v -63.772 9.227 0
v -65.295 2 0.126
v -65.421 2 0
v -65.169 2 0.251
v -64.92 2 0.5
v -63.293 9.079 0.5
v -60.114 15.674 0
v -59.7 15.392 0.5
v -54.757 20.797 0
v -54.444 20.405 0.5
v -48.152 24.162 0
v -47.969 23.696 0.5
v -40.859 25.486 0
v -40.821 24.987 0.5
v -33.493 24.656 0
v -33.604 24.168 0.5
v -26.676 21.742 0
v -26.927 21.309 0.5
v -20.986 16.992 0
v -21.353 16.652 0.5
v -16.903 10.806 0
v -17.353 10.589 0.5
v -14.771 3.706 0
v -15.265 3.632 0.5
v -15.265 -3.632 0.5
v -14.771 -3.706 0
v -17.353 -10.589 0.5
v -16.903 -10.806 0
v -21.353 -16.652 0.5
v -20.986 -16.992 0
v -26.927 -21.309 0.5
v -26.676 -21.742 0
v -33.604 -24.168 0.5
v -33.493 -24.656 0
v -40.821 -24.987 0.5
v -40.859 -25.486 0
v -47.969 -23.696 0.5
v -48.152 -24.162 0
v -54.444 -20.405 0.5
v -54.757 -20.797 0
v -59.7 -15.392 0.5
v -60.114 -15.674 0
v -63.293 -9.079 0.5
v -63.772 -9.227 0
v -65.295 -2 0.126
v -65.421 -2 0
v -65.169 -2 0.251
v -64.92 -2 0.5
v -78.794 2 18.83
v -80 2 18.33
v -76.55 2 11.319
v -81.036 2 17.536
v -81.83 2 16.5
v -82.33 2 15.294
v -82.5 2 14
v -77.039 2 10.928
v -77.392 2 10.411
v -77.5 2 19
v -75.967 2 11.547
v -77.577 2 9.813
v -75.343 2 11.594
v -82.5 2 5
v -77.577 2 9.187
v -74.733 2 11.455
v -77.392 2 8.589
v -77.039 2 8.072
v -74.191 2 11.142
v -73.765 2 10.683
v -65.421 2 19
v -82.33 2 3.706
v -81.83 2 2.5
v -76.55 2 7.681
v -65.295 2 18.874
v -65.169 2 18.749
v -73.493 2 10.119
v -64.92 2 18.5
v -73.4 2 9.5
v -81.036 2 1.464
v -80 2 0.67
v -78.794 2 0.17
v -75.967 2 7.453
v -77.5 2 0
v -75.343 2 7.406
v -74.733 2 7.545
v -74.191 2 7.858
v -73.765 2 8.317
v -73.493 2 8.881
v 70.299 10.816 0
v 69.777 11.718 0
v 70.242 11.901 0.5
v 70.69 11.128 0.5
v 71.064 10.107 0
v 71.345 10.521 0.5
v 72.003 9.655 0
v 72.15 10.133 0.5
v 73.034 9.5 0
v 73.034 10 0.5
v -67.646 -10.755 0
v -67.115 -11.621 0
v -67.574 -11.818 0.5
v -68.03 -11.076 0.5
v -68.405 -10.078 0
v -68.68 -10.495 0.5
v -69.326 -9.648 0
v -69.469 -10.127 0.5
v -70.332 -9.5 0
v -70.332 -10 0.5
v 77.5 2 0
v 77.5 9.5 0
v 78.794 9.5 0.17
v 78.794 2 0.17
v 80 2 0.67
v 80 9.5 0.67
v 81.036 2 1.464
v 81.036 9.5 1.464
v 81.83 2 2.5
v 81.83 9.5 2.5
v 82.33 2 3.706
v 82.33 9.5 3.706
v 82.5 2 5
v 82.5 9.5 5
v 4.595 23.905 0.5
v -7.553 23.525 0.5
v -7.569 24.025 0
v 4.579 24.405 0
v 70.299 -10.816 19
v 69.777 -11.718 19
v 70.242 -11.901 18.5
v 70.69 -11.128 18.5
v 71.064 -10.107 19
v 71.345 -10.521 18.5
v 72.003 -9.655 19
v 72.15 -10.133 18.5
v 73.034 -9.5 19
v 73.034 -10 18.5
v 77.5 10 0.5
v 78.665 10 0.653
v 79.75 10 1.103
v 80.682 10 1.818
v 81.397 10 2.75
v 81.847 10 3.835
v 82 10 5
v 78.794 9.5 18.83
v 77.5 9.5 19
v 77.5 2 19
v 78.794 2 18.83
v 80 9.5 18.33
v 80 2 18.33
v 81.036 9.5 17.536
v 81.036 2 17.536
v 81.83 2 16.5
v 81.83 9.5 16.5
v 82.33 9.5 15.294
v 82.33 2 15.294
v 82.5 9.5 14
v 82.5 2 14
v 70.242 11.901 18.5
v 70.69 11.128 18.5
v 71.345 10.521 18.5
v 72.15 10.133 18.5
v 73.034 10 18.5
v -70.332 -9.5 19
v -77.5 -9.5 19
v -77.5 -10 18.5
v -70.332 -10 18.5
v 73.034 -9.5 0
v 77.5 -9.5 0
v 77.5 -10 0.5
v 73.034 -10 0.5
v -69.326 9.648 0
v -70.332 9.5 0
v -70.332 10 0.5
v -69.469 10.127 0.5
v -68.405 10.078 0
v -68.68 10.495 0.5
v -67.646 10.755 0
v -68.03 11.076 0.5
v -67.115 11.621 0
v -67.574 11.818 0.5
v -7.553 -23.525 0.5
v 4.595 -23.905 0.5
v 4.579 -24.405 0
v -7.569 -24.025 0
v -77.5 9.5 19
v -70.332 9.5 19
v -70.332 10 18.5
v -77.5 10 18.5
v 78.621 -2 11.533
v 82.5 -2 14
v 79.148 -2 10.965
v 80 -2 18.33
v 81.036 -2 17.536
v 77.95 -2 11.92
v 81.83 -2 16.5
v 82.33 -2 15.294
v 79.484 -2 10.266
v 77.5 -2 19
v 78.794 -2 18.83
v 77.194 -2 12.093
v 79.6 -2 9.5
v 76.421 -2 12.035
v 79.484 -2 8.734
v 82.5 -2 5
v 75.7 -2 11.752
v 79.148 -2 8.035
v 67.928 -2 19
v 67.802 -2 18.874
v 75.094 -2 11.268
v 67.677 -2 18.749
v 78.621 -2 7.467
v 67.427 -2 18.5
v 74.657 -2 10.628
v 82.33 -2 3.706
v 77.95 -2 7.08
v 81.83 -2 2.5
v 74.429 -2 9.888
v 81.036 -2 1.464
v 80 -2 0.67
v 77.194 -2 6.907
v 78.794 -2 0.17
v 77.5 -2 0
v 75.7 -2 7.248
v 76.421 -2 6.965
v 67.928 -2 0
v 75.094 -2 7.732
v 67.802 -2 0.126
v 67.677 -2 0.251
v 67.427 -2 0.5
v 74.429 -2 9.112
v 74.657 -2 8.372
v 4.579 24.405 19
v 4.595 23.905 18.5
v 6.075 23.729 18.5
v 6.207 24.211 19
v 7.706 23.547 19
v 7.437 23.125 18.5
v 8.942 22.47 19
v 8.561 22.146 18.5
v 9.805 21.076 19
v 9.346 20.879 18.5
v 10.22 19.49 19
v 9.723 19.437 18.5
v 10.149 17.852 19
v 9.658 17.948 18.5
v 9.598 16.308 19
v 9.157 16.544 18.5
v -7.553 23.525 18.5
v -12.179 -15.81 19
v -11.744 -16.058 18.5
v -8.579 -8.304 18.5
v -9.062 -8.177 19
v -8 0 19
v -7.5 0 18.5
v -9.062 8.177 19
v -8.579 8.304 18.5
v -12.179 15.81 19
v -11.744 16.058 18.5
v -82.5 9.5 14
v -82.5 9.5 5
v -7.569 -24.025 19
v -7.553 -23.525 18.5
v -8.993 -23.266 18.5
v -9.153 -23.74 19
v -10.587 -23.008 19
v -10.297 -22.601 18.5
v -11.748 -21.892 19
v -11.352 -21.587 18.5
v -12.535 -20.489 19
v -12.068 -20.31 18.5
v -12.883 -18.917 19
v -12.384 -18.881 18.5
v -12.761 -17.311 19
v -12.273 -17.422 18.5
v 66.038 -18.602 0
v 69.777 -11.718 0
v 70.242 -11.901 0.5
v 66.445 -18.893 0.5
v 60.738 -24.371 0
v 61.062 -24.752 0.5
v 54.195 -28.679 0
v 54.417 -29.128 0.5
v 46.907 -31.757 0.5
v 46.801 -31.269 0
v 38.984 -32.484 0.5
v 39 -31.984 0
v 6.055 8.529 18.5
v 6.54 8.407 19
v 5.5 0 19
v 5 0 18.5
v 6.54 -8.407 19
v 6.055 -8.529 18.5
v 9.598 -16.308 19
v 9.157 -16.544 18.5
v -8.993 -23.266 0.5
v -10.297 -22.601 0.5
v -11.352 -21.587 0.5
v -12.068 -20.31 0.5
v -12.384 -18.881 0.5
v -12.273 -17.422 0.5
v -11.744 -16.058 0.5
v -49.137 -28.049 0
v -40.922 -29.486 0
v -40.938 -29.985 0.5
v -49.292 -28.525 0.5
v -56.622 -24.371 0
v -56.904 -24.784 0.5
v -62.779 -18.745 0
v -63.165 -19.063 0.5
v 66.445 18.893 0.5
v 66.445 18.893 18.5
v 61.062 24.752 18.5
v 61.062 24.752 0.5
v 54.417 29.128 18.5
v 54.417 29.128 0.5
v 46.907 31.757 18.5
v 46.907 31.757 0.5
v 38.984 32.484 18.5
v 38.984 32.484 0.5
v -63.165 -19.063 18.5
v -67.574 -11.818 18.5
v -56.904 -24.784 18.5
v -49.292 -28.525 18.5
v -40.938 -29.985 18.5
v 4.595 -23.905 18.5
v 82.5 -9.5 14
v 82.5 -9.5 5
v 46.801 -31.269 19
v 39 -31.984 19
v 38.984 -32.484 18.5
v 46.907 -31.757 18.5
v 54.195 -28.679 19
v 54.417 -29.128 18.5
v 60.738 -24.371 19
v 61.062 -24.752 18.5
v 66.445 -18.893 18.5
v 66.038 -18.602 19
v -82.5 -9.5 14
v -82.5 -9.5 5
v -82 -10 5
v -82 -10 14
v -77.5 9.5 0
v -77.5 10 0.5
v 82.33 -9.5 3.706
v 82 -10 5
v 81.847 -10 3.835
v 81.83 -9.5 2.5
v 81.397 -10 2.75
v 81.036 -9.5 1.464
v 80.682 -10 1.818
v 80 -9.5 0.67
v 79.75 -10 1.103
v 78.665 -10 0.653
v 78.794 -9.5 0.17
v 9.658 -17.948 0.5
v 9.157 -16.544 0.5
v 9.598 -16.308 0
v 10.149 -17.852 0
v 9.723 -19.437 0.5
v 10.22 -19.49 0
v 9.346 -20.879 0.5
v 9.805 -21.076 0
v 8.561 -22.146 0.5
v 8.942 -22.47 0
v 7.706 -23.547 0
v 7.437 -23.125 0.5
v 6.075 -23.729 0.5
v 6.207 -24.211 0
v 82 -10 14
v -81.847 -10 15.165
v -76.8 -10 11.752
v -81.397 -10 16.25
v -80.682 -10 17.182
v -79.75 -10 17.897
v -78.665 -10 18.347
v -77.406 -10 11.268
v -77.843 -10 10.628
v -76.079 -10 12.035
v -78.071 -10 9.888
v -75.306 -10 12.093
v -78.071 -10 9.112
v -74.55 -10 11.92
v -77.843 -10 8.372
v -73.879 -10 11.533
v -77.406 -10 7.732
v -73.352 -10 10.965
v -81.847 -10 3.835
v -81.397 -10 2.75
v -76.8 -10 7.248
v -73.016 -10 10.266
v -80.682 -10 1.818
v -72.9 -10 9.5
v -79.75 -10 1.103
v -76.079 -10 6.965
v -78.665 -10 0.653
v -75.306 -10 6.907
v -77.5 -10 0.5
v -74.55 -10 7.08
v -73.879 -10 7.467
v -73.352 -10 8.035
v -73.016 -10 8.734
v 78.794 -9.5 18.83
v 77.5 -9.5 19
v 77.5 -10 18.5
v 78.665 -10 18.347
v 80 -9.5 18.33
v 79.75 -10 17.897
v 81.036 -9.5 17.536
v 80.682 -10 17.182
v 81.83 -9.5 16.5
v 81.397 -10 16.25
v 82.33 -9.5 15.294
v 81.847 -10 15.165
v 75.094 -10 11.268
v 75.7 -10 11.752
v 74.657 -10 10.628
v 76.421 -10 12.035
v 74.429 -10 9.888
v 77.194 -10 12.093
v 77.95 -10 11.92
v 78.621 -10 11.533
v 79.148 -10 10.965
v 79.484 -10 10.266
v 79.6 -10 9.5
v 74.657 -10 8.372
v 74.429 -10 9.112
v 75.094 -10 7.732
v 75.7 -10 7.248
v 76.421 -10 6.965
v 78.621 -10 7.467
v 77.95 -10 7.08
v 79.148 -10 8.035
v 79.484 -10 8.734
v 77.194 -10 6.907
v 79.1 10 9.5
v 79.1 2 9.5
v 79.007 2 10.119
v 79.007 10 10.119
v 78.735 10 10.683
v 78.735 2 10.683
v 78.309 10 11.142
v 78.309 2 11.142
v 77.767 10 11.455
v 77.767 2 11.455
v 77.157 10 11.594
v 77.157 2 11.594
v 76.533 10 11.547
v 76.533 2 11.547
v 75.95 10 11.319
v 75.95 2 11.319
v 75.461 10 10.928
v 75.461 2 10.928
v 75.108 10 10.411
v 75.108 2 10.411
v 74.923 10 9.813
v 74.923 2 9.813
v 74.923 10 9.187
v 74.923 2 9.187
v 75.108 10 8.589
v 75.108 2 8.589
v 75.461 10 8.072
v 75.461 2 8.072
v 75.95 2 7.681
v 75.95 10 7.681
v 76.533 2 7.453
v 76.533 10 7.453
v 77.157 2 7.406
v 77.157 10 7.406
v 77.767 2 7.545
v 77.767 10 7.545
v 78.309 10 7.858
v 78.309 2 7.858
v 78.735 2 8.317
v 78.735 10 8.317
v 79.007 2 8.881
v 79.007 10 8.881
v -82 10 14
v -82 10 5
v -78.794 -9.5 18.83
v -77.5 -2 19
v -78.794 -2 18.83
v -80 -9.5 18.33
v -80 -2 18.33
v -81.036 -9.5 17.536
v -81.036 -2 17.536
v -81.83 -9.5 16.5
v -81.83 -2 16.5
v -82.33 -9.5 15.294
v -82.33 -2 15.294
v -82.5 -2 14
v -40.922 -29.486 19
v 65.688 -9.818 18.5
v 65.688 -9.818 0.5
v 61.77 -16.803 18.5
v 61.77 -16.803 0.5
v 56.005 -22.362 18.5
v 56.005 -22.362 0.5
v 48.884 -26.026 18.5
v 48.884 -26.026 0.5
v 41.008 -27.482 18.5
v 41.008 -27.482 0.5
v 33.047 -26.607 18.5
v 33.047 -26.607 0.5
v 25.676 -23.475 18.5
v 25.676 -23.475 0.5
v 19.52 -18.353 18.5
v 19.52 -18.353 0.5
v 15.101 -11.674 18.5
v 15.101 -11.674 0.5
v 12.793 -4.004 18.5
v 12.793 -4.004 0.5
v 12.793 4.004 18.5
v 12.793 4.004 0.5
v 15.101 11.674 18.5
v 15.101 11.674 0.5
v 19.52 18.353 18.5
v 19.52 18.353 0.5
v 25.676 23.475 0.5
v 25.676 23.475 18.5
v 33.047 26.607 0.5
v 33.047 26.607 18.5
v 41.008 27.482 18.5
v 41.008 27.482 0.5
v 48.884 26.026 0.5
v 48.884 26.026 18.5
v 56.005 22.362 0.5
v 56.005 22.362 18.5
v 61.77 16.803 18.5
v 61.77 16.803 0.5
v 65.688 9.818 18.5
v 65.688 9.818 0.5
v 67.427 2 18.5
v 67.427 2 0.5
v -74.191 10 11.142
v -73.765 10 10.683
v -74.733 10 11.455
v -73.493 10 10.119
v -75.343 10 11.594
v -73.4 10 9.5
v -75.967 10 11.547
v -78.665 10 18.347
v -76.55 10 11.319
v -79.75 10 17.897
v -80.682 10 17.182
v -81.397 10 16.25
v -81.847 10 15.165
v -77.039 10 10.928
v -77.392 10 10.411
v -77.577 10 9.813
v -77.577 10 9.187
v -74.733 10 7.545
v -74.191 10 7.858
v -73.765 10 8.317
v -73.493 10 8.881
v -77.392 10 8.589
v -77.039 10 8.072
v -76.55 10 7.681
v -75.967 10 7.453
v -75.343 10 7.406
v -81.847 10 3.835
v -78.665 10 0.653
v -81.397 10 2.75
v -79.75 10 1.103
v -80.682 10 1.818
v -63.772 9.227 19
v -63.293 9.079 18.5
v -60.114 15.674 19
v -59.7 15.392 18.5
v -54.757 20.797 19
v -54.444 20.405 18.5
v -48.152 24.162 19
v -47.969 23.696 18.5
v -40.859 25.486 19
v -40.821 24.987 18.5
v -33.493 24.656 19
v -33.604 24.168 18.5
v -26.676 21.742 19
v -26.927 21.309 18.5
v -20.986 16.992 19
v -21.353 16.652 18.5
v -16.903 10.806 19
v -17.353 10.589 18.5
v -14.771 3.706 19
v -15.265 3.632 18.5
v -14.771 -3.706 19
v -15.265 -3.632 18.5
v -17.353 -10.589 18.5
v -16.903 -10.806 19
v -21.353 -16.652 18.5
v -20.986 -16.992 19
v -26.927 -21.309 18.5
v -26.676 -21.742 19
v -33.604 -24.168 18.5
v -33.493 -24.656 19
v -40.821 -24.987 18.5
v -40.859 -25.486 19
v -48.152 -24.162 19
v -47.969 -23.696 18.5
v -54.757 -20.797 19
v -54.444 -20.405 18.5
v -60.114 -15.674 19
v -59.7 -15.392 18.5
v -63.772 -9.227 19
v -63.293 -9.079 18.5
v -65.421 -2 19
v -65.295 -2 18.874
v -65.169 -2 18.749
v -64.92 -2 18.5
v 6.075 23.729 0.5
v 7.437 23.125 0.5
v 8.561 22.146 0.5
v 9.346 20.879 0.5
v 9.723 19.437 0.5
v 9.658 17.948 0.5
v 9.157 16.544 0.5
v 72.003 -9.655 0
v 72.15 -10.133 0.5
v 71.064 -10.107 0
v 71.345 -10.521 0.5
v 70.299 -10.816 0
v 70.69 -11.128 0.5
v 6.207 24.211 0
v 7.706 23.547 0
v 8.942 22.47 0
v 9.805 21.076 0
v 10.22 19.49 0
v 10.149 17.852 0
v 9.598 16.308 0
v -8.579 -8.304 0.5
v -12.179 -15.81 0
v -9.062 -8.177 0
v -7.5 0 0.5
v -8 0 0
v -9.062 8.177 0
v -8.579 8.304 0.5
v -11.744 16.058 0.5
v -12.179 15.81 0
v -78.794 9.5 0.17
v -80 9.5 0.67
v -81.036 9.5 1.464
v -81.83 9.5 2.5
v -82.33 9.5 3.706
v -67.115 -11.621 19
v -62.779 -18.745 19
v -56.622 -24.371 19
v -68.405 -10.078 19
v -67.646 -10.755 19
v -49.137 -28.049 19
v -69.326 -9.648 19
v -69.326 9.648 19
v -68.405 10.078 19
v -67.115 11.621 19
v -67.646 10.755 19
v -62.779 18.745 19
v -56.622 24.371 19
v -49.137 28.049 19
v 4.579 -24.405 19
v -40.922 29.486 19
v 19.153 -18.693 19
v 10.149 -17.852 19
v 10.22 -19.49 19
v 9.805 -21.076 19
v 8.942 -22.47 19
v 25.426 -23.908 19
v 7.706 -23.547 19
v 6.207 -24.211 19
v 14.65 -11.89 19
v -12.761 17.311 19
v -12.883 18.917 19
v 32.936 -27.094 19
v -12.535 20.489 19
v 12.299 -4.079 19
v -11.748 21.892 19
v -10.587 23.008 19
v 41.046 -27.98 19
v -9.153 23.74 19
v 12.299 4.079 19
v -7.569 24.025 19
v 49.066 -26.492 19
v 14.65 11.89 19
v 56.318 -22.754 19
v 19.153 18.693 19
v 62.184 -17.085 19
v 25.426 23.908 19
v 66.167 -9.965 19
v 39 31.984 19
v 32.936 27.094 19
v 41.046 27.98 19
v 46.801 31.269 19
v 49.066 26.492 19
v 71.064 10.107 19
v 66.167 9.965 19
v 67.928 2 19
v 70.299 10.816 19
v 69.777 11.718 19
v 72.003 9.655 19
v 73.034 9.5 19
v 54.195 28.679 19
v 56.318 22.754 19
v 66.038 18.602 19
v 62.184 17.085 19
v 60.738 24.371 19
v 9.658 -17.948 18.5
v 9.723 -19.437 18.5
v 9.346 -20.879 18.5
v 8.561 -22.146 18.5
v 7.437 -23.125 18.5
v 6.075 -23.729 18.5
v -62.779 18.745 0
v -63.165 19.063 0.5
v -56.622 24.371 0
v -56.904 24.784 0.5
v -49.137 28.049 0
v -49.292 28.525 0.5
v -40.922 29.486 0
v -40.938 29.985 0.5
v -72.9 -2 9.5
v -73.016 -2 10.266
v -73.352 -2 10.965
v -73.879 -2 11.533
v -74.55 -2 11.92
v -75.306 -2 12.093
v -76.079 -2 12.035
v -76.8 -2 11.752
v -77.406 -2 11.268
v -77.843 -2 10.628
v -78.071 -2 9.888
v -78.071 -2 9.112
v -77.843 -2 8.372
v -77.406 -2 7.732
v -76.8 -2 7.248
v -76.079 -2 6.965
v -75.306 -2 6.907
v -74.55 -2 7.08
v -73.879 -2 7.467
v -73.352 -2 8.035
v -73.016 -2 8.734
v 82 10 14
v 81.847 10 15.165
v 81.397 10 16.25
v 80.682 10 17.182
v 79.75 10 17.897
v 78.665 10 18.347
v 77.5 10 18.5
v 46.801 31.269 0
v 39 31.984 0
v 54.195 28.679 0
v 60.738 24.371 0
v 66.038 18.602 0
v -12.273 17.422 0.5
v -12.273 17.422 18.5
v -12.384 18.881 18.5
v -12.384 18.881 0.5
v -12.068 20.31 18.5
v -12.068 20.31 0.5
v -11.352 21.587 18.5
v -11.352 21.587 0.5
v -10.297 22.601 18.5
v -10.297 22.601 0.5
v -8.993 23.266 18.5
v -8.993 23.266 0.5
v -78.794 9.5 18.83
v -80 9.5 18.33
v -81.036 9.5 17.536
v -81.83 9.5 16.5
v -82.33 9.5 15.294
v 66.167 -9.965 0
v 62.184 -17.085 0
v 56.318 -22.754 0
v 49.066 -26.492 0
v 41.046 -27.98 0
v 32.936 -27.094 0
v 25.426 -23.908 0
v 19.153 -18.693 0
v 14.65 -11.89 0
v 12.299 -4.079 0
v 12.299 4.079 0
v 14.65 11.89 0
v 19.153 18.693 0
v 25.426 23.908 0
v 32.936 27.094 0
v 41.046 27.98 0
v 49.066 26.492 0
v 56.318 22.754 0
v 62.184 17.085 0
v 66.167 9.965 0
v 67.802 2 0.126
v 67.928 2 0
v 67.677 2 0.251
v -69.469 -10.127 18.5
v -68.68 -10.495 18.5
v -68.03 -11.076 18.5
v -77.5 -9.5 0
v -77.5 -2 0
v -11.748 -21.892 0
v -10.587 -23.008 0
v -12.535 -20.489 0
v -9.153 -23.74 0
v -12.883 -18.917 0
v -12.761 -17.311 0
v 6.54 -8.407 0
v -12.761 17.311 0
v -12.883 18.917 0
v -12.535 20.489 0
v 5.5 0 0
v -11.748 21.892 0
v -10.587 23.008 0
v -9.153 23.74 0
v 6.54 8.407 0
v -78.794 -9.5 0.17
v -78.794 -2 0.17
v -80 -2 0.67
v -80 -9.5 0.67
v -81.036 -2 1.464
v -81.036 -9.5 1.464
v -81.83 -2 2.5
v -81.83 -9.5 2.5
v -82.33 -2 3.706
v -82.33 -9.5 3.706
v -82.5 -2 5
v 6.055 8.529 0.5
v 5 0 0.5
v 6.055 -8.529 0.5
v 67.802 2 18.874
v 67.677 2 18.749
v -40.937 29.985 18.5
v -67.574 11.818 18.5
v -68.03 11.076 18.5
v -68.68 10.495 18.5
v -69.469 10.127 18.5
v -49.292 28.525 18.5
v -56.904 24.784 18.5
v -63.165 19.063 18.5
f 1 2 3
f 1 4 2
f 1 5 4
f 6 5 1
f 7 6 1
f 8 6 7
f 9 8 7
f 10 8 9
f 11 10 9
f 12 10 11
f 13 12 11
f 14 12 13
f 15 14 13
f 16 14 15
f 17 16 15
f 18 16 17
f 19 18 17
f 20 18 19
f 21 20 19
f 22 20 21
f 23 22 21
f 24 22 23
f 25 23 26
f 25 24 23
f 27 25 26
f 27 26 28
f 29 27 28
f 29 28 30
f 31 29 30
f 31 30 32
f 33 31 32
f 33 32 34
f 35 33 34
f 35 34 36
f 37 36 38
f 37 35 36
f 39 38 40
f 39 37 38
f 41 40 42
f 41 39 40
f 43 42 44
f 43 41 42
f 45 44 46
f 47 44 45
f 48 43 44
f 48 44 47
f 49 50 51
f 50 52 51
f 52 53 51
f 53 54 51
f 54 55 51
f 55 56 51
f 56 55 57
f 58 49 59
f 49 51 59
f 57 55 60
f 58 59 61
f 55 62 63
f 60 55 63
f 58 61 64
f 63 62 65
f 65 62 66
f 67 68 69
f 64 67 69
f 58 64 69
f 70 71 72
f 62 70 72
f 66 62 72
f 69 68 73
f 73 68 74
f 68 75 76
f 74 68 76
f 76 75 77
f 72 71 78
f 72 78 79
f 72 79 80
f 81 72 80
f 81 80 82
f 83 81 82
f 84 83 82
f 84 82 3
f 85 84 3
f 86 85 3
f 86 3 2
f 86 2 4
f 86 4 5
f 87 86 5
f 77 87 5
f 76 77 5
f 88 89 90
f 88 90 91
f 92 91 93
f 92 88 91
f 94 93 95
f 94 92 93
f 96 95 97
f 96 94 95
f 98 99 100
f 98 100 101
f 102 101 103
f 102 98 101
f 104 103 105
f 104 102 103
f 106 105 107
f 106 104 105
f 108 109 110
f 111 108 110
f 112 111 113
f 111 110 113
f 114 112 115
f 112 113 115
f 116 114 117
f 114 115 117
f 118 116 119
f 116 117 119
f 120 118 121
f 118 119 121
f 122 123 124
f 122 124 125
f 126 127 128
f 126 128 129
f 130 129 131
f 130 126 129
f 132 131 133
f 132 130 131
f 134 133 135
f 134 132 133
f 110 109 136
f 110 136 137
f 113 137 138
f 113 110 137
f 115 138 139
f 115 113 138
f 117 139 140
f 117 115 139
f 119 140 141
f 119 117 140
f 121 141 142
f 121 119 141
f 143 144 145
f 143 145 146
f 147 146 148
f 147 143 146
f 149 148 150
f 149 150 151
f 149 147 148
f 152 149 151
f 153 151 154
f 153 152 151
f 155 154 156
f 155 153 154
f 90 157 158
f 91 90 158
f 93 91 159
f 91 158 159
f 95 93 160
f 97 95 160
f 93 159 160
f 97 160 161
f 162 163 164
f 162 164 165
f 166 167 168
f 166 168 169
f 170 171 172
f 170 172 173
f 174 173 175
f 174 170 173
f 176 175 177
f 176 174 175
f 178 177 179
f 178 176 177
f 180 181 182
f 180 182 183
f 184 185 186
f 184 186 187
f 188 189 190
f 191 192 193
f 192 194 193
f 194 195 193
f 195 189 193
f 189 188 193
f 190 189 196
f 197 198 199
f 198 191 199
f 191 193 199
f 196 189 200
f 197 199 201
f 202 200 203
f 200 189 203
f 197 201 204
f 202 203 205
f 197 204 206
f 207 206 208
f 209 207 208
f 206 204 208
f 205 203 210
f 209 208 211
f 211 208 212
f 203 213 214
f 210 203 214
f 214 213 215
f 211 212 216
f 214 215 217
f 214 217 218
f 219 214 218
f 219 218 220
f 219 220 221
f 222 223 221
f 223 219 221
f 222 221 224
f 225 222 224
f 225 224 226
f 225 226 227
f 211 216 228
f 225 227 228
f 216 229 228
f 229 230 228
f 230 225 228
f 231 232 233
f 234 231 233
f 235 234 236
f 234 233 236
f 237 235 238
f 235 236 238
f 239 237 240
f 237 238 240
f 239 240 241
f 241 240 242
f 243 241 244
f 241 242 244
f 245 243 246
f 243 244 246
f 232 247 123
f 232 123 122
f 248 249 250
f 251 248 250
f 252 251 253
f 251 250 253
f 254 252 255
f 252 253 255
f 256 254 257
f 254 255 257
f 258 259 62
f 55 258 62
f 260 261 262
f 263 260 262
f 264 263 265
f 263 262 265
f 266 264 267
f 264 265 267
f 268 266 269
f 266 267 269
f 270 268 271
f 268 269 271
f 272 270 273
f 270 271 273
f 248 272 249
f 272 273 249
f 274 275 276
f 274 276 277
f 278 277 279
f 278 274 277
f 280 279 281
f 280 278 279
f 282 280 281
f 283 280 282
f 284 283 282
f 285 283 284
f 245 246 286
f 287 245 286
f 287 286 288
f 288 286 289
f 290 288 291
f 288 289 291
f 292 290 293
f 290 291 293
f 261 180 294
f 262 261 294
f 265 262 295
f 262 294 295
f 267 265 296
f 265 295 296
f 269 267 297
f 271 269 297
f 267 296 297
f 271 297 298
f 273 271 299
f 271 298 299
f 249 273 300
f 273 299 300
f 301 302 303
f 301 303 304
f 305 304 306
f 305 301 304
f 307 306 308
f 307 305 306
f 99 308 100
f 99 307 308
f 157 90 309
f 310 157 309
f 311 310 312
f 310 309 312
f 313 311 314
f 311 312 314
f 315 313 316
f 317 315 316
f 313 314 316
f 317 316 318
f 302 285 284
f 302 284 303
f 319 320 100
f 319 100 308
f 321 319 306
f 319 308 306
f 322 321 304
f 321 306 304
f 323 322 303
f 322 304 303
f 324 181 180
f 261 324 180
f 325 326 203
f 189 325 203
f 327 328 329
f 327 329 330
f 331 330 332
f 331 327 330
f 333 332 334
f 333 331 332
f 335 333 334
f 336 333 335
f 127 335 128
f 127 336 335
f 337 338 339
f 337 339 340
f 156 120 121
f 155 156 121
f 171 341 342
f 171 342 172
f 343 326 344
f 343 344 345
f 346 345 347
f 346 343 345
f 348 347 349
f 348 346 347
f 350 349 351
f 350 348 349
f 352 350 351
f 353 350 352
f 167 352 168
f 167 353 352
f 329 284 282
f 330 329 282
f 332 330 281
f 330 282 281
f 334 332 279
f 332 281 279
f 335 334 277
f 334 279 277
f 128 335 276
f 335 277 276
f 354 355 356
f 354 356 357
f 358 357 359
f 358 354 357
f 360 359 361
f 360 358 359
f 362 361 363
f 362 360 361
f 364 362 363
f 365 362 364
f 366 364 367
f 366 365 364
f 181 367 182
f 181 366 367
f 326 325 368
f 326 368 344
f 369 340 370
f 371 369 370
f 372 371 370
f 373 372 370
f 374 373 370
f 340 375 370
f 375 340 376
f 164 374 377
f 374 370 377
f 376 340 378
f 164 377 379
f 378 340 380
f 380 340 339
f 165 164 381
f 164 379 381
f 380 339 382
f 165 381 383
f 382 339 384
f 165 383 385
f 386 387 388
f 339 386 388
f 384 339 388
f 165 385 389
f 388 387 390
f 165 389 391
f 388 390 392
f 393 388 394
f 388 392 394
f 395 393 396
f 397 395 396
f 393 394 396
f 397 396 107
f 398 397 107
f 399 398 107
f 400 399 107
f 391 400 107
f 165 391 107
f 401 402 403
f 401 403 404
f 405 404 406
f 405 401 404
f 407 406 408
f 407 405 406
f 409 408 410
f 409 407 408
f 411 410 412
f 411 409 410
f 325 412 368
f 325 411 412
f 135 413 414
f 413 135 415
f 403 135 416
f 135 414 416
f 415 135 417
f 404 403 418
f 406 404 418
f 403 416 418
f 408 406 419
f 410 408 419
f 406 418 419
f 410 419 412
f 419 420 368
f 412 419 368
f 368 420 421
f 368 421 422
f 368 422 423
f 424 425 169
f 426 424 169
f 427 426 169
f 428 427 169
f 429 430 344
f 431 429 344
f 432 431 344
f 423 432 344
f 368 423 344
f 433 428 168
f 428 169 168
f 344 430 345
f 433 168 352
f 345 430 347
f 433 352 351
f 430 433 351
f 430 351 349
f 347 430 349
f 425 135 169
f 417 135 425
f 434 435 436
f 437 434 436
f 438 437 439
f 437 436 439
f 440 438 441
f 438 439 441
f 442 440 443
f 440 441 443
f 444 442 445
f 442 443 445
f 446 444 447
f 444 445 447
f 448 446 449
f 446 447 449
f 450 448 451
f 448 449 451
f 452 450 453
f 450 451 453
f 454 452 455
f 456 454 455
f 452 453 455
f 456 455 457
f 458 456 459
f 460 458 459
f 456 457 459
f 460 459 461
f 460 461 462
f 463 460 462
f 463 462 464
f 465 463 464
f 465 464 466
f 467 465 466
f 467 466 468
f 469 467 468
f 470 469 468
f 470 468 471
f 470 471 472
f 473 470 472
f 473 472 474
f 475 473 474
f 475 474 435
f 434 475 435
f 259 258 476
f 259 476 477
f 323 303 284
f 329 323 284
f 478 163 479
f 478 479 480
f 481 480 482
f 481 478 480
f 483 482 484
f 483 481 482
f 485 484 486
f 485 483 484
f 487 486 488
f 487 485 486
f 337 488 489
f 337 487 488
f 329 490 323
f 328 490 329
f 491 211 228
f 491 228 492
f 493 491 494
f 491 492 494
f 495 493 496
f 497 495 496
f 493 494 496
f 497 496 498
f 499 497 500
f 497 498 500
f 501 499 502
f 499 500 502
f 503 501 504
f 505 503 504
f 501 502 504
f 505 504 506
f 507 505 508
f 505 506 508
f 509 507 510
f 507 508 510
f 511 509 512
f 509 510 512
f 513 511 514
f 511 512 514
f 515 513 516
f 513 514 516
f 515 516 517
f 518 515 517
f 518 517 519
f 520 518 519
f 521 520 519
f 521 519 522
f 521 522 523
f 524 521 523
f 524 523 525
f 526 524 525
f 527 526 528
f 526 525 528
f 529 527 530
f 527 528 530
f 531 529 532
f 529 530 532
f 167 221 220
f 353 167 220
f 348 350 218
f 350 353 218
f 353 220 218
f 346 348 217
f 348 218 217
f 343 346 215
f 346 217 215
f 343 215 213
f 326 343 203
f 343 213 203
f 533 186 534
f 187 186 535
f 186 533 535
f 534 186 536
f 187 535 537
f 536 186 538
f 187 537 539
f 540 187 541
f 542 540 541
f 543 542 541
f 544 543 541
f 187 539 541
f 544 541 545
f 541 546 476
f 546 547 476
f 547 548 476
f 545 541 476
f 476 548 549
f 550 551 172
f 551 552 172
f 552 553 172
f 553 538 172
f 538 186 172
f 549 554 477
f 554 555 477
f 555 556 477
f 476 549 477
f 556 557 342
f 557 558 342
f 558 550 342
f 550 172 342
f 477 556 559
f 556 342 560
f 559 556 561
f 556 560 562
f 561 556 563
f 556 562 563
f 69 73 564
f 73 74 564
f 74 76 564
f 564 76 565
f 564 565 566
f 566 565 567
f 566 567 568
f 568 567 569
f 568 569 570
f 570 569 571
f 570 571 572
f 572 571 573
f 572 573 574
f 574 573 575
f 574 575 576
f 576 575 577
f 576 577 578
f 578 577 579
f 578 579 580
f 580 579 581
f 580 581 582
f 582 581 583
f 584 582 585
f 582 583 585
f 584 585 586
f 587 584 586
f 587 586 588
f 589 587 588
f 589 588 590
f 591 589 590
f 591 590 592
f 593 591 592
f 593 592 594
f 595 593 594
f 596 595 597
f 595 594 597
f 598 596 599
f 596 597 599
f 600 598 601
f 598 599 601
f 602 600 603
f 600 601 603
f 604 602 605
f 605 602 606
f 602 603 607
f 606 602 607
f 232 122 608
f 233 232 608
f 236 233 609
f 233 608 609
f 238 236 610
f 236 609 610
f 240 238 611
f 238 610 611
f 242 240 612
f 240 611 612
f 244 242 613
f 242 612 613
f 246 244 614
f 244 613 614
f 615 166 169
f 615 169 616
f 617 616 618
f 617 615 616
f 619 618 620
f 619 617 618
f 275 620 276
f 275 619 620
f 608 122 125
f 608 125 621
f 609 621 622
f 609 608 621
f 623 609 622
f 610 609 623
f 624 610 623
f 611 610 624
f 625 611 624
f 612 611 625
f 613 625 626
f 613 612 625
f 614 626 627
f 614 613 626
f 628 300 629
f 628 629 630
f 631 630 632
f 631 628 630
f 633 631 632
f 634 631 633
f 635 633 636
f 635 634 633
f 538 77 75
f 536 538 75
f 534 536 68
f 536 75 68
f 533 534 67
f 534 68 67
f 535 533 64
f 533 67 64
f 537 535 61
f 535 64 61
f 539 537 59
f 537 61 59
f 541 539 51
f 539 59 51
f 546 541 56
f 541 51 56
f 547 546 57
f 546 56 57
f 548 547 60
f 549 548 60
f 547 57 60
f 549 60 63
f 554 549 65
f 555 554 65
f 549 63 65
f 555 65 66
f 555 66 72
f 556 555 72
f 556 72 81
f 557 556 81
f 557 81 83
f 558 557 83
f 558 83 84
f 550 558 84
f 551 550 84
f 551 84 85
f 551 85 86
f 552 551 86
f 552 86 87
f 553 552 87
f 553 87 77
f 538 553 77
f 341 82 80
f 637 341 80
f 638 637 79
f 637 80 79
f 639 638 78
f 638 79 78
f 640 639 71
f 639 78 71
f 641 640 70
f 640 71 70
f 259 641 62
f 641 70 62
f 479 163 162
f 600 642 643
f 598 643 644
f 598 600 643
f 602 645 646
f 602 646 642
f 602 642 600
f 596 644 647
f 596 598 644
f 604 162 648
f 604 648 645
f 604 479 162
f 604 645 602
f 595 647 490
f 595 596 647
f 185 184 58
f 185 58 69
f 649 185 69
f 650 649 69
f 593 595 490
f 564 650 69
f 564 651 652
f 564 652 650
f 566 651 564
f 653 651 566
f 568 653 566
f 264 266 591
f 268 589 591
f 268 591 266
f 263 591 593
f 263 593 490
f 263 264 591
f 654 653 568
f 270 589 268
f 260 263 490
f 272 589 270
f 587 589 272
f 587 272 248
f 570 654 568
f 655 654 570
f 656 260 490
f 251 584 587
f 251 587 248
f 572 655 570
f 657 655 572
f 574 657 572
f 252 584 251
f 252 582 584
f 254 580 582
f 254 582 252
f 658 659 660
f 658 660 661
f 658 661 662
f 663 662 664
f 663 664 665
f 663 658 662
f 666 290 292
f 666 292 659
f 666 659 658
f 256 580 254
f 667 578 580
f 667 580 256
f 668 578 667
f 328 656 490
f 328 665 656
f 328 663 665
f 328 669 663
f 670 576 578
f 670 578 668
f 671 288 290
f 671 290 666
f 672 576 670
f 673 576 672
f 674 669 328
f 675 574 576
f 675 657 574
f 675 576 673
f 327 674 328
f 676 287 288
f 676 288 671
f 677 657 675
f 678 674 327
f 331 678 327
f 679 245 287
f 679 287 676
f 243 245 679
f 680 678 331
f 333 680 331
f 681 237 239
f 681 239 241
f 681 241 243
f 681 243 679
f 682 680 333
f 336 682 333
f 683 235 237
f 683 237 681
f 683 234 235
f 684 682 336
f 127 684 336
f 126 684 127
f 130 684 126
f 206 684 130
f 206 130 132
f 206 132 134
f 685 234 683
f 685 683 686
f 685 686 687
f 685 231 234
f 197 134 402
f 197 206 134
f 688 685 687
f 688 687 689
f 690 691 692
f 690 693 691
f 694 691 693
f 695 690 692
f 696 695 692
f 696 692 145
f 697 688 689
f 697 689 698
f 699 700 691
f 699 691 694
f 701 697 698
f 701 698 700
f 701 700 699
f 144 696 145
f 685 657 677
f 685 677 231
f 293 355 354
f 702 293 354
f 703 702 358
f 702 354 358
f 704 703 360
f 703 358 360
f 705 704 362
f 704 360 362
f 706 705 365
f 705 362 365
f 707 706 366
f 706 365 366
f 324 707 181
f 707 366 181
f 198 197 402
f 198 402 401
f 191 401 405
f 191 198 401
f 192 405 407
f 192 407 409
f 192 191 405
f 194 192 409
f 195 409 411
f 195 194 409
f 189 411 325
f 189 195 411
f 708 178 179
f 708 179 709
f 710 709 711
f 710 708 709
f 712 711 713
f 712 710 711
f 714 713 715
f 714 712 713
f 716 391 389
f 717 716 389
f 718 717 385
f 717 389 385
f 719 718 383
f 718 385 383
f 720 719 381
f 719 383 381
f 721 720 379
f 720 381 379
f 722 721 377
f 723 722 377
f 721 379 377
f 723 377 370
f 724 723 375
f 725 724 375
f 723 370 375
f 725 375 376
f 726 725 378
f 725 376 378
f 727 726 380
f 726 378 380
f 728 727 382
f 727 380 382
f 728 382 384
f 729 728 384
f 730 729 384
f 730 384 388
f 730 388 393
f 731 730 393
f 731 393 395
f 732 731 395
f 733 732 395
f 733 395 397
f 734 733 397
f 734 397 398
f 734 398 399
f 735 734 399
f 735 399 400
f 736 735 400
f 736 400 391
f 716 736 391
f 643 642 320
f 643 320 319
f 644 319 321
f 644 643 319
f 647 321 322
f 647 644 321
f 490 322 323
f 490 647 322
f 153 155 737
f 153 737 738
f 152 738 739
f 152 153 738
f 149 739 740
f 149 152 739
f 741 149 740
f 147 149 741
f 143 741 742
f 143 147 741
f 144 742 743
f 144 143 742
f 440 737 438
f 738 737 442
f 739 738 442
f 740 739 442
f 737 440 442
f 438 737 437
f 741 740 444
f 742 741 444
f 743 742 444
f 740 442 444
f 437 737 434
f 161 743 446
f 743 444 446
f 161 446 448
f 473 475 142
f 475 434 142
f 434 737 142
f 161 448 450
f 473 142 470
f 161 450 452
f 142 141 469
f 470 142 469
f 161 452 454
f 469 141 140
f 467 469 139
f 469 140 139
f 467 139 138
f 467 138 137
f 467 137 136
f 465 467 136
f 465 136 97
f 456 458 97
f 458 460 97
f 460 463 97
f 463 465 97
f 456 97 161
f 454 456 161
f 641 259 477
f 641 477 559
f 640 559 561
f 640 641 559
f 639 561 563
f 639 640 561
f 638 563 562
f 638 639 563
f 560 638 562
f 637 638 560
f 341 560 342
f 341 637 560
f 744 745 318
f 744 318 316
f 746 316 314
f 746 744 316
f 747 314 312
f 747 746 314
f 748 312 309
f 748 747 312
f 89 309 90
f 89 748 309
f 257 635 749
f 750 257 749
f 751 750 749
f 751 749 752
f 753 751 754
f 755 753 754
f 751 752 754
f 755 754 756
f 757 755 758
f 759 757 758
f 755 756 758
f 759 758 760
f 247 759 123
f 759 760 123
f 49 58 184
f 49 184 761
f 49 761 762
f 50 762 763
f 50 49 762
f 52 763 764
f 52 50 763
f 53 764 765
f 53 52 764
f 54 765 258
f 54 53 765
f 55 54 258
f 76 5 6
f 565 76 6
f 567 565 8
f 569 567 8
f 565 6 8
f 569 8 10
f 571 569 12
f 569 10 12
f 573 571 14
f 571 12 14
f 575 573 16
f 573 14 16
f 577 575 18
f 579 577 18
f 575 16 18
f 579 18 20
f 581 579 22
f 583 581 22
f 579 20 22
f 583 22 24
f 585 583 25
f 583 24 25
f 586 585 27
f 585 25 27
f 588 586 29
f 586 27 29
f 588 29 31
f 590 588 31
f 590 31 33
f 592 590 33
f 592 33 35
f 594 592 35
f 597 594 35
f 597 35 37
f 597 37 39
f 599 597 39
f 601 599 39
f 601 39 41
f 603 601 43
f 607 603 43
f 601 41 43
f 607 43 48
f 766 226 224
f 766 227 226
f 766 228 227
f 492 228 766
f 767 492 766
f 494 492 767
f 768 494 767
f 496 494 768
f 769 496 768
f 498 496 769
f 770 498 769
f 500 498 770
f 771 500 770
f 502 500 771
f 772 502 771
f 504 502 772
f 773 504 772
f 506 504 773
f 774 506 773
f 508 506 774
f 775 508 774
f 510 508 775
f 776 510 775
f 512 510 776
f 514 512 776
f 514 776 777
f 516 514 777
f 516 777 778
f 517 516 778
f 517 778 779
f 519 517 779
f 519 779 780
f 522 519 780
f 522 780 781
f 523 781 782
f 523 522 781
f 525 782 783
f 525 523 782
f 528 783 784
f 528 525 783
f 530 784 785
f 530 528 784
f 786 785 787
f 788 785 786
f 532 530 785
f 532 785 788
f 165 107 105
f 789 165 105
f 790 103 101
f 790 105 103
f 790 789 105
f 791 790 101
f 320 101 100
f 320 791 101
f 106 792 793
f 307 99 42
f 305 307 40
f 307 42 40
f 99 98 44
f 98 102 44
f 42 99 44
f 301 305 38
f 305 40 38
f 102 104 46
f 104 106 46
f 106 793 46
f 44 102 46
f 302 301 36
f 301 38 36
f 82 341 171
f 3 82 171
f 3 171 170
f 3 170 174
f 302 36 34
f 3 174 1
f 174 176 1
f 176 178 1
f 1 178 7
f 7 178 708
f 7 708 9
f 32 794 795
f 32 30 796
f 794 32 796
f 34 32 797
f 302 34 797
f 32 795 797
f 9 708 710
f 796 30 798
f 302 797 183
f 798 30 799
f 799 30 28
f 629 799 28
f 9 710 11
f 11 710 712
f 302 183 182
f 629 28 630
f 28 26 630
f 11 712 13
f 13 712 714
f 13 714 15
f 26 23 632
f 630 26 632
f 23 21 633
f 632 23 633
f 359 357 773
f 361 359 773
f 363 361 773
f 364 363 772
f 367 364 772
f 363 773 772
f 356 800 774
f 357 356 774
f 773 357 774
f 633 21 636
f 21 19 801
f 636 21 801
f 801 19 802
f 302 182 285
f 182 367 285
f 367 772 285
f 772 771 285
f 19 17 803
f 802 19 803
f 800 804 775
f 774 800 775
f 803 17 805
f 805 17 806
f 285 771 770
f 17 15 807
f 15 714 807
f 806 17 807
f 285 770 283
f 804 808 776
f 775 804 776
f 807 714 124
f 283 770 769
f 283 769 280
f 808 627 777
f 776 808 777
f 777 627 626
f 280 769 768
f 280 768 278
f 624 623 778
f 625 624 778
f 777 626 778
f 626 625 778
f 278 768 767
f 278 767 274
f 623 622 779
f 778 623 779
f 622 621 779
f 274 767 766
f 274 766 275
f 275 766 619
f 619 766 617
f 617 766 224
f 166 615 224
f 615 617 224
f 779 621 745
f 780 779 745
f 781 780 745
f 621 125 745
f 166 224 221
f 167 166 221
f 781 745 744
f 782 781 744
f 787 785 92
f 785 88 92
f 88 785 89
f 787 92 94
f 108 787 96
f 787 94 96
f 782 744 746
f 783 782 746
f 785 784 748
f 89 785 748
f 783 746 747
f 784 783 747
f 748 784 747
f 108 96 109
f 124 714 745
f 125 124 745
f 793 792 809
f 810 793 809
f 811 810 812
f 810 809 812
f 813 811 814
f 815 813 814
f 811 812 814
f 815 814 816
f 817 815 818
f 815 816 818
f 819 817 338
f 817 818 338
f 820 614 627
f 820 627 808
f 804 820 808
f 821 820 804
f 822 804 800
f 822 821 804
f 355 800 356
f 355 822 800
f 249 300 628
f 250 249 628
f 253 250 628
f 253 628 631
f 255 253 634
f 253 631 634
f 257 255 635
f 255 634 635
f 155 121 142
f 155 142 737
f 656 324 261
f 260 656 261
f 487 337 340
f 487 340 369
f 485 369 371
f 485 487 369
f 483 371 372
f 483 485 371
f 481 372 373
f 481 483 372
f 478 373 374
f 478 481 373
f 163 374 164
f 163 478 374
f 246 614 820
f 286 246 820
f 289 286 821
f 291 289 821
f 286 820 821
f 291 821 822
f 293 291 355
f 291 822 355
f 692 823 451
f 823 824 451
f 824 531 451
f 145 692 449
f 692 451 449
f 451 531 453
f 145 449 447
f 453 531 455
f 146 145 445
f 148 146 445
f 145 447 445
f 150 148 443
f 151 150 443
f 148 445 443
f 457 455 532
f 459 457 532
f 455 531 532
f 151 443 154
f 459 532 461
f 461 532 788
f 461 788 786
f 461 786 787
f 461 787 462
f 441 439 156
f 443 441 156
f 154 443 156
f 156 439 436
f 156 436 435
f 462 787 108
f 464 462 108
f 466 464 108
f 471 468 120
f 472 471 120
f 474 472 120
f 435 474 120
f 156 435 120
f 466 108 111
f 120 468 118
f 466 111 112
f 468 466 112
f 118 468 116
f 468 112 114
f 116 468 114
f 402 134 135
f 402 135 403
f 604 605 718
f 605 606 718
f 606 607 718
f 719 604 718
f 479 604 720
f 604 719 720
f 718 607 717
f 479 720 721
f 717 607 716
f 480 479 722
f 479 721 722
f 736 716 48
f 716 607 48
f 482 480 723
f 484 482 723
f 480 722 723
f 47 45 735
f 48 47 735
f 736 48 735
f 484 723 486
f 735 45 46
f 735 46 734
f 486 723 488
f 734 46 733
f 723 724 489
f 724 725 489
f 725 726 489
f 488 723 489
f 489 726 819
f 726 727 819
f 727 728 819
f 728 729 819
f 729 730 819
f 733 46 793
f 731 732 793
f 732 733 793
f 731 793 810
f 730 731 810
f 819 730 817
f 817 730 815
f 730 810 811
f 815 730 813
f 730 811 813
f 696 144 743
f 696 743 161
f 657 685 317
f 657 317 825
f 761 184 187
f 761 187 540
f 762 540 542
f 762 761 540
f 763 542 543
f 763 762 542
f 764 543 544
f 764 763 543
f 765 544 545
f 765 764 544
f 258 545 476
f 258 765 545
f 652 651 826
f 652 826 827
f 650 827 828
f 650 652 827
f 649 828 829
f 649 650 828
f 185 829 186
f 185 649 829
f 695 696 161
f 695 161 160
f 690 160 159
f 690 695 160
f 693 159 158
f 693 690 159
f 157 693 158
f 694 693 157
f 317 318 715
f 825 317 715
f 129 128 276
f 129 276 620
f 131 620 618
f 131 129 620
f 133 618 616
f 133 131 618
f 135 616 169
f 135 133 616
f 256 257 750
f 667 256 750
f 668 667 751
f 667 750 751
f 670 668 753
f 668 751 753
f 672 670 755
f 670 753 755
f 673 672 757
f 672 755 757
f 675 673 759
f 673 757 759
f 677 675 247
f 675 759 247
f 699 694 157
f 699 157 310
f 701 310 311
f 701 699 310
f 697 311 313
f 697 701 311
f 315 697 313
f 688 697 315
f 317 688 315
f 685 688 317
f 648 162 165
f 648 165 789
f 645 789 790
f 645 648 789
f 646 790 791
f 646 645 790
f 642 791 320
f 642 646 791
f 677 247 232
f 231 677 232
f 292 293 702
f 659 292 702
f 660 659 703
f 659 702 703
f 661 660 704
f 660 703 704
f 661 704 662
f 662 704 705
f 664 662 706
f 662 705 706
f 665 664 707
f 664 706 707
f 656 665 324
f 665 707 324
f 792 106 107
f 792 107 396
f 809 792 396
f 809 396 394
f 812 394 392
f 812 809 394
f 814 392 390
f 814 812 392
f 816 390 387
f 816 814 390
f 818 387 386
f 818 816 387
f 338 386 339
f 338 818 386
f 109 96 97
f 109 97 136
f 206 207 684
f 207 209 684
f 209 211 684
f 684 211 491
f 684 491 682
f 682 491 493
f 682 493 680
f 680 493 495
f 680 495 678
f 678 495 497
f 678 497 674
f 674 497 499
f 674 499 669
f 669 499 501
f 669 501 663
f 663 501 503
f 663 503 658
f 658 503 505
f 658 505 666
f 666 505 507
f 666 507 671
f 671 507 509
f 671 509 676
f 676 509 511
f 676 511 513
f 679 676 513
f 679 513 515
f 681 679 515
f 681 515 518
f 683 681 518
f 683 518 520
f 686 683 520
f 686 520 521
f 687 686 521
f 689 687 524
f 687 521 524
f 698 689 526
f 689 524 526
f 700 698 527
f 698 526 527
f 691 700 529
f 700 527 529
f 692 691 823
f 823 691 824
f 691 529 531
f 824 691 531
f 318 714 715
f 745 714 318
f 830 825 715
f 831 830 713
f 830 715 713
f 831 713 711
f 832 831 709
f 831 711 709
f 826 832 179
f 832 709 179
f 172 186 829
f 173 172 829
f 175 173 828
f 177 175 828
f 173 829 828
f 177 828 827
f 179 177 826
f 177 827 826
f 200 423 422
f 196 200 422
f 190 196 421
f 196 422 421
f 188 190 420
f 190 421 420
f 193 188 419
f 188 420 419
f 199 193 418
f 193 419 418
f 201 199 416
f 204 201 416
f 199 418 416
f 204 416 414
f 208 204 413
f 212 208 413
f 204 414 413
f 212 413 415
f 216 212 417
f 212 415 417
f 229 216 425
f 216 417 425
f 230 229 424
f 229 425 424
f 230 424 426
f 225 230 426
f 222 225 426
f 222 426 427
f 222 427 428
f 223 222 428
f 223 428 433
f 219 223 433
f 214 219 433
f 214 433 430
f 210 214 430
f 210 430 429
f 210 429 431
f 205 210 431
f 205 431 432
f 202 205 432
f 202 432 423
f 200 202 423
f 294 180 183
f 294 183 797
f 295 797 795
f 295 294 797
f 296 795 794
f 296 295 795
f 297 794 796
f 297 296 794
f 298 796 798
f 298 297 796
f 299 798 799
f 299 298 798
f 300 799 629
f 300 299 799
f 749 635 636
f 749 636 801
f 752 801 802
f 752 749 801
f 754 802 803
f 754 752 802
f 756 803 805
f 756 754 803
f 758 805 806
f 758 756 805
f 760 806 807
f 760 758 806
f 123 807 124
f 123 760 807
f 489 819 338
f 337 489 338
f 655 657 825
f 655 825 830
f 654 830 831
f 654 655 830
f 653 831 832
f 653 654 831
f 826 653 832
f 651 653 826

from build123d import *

# Parameters (mm, degrees)
F1_DEPTH = 19
F2_R     = 2.1
F3_DEPTH = 25
F4_R     = 2.6
F5_DEPTH = 10
F6_R     = 2.6
F7_DEPTH = 10
F8_R     = 5
F9_SIZE  = 0.5
F10_SIZE = 0.5
F11_R    = 3
F12_SIZE = 0.5


with BuildPart() as f1:
    # F0 (on Top) → F1 (new body)
    with BuildSketch(Plane.XY):
        with BuildLine():
            ThreePointArc((-64.919872, 2), (-15, 0), (-64.919872, -2))
            Line((-64.919872, -2), (-82.5, -2))
            Line((-82.5, -2), (-82.5, -10))
            Line((-82.5, -10), (-68.284271, -10))
            ThreePointArc((-68.284271, -10), (-57.701173, -24.22124), (-40.9375, -29.985348))
            Line((-40.9375, -29.985348), (38.984375, -32.484127))
            ThreePointArc((38.984375, -32.484127), (58.708317, -26.575343), (70.923292, -10))
            Line((70.923292, -10), (82.5, -10))
            Line((82.5, -10), (82.5, -2))
            Line((82.5, -2), (67.427176, -2))
            ThreePointArc((67.427176, -2), (12.5, 0), (67.427176, 2))
            Line((67.427176, 2), (82.5, 2))
            Line((82.5, 2), (82.5, 10))
            Line((82.5, 10), (70.923292, 10))
            ThreePointArc((70.923292, 10), (58.708317, 26.575343), (38.984375, 32.484127))
            Line((38.984375, 32.484127), (-40.9375, 29.985348))
            ThreePointArc((-40.9375, 29.985348), (-57.701173, 24.22124), (-68.284271, 10))
            Line((-68.284271, 10), (-82.5, 10))
            Line((-82.5, 10), (-82.5, 2))
            Line((-82.5, 2), (-64.919872, 2))
        make_face()
        with BuildLine():
            ThreePointArc((-7.553076, -23.525456), (-11.757166, -20.974822), (-11.743915, -16.057512))
            ThreePointArc((-11.743915, -16.057512), (-7.5, 0), (-11.743915, 16.057512))
            ThreePointArc((-11.743915, 16.057512), (-11.757166, 20.974822), (-7.553076, 23.525456))
            Line((-7.553076, 23.525456), (4.594653, 23.905258))
            ThreePointArc((4.594653, 23.905258), (9.00079, 21.541796), (9.15704, 16.544238))
            ThreePointArc((9.15704, 16.544238), (5, 0), (9.15704, -16.544238))
            ThreePointArc((9.15704, -16.544238), (9.00079, -21.541796), (4.594653, -23.905258))
            Line((4.594653, -23.905258), (-7.553076, -23.525456))
        make_face(mode=Mode.SUBTRACT)
    extrude(amount=F1_DEPTH)

    # F2 (on face) → F3 (cut)
    with BuildSketch(Plane.XZ.offset(10)):
        with Locations((-75.5, 9.5)):
            Circle(F2_R)
        with Locations((77, 9.5)):
            Circle(F2_R)
    extrude(amount=-F3_DEPTH, mode=Mode.SUBTRACT)

    # F4 (on face) → F5 (cut)
    with BuildSketch(Plane.XZ.offset(10)):
        with Locations((-75.5, 9.5)):
            Circle(F4_R)
    extrude(amount=-F5_DEPTH, mode=Mode.SUBTRACT)

    # F6 (on face) → F7 (cut)
    with BuildSketch(Plane.XZ.offset(10)):
        with Locations((77, 9.5)):
            Circle(F6_R)
    extrude(amount=-F7_DEPTH, mode=Mode.SUBTRACT)

    # F8
    f8_edges = [f1.edges().sort_by_distance(p)[0] for p in [
        (82.5, 6, 19),
        (82.5, -6, 19),
        (82.5, 6, 0),
        (82.5, -6, 0),
        (-82.5, -6, 0),
        (-82.5, -6, 19),
        (-82.5, 6, 19),
        (-82.5, 6, 0),
    ]]
    fillet(f8_edges, radius=F8_R)

    # F9
    f9_edges = [f1.edges().sort_by_distance(p)[0] for p in [
        (-15, 0, 0),
        (12.5, 0, 0),
        (12.5, 0, 19),
        (-15, 0, 19),
    ]]
    chamfer(f9_edges, length=F9_SIZE)

    # F10
    f10_edges = [f1.edges().sort_by_distance(p)[0] for p in [
        (-1.479211, 23.715357, 19),
        (5, 0, 0),
    ]]
    chamfer(f10_edges, length=F10_SIZE)

    # F11
    f11_edges = [f1.edges().sort_by_distance(p)[0] for p in [
        (-68.284271, 10, 9.5),
        (-68.284271, -10, 9.5),
        (70.923292, -10, 9.5),
        (70.923292, 10, 9.5),
    ]]
    fillet(f11_edges, radius=F11_R)

    # F12
    f12_edges = [f1.edges().sort_by_distance(p)[0] for p in [
        (57.873558, 27.143801, 19),
        (57.873558, -27.143801, 19),
    ]]
    chamfer(f12_edges, length=F12_SIZE)


solid = f1.part
